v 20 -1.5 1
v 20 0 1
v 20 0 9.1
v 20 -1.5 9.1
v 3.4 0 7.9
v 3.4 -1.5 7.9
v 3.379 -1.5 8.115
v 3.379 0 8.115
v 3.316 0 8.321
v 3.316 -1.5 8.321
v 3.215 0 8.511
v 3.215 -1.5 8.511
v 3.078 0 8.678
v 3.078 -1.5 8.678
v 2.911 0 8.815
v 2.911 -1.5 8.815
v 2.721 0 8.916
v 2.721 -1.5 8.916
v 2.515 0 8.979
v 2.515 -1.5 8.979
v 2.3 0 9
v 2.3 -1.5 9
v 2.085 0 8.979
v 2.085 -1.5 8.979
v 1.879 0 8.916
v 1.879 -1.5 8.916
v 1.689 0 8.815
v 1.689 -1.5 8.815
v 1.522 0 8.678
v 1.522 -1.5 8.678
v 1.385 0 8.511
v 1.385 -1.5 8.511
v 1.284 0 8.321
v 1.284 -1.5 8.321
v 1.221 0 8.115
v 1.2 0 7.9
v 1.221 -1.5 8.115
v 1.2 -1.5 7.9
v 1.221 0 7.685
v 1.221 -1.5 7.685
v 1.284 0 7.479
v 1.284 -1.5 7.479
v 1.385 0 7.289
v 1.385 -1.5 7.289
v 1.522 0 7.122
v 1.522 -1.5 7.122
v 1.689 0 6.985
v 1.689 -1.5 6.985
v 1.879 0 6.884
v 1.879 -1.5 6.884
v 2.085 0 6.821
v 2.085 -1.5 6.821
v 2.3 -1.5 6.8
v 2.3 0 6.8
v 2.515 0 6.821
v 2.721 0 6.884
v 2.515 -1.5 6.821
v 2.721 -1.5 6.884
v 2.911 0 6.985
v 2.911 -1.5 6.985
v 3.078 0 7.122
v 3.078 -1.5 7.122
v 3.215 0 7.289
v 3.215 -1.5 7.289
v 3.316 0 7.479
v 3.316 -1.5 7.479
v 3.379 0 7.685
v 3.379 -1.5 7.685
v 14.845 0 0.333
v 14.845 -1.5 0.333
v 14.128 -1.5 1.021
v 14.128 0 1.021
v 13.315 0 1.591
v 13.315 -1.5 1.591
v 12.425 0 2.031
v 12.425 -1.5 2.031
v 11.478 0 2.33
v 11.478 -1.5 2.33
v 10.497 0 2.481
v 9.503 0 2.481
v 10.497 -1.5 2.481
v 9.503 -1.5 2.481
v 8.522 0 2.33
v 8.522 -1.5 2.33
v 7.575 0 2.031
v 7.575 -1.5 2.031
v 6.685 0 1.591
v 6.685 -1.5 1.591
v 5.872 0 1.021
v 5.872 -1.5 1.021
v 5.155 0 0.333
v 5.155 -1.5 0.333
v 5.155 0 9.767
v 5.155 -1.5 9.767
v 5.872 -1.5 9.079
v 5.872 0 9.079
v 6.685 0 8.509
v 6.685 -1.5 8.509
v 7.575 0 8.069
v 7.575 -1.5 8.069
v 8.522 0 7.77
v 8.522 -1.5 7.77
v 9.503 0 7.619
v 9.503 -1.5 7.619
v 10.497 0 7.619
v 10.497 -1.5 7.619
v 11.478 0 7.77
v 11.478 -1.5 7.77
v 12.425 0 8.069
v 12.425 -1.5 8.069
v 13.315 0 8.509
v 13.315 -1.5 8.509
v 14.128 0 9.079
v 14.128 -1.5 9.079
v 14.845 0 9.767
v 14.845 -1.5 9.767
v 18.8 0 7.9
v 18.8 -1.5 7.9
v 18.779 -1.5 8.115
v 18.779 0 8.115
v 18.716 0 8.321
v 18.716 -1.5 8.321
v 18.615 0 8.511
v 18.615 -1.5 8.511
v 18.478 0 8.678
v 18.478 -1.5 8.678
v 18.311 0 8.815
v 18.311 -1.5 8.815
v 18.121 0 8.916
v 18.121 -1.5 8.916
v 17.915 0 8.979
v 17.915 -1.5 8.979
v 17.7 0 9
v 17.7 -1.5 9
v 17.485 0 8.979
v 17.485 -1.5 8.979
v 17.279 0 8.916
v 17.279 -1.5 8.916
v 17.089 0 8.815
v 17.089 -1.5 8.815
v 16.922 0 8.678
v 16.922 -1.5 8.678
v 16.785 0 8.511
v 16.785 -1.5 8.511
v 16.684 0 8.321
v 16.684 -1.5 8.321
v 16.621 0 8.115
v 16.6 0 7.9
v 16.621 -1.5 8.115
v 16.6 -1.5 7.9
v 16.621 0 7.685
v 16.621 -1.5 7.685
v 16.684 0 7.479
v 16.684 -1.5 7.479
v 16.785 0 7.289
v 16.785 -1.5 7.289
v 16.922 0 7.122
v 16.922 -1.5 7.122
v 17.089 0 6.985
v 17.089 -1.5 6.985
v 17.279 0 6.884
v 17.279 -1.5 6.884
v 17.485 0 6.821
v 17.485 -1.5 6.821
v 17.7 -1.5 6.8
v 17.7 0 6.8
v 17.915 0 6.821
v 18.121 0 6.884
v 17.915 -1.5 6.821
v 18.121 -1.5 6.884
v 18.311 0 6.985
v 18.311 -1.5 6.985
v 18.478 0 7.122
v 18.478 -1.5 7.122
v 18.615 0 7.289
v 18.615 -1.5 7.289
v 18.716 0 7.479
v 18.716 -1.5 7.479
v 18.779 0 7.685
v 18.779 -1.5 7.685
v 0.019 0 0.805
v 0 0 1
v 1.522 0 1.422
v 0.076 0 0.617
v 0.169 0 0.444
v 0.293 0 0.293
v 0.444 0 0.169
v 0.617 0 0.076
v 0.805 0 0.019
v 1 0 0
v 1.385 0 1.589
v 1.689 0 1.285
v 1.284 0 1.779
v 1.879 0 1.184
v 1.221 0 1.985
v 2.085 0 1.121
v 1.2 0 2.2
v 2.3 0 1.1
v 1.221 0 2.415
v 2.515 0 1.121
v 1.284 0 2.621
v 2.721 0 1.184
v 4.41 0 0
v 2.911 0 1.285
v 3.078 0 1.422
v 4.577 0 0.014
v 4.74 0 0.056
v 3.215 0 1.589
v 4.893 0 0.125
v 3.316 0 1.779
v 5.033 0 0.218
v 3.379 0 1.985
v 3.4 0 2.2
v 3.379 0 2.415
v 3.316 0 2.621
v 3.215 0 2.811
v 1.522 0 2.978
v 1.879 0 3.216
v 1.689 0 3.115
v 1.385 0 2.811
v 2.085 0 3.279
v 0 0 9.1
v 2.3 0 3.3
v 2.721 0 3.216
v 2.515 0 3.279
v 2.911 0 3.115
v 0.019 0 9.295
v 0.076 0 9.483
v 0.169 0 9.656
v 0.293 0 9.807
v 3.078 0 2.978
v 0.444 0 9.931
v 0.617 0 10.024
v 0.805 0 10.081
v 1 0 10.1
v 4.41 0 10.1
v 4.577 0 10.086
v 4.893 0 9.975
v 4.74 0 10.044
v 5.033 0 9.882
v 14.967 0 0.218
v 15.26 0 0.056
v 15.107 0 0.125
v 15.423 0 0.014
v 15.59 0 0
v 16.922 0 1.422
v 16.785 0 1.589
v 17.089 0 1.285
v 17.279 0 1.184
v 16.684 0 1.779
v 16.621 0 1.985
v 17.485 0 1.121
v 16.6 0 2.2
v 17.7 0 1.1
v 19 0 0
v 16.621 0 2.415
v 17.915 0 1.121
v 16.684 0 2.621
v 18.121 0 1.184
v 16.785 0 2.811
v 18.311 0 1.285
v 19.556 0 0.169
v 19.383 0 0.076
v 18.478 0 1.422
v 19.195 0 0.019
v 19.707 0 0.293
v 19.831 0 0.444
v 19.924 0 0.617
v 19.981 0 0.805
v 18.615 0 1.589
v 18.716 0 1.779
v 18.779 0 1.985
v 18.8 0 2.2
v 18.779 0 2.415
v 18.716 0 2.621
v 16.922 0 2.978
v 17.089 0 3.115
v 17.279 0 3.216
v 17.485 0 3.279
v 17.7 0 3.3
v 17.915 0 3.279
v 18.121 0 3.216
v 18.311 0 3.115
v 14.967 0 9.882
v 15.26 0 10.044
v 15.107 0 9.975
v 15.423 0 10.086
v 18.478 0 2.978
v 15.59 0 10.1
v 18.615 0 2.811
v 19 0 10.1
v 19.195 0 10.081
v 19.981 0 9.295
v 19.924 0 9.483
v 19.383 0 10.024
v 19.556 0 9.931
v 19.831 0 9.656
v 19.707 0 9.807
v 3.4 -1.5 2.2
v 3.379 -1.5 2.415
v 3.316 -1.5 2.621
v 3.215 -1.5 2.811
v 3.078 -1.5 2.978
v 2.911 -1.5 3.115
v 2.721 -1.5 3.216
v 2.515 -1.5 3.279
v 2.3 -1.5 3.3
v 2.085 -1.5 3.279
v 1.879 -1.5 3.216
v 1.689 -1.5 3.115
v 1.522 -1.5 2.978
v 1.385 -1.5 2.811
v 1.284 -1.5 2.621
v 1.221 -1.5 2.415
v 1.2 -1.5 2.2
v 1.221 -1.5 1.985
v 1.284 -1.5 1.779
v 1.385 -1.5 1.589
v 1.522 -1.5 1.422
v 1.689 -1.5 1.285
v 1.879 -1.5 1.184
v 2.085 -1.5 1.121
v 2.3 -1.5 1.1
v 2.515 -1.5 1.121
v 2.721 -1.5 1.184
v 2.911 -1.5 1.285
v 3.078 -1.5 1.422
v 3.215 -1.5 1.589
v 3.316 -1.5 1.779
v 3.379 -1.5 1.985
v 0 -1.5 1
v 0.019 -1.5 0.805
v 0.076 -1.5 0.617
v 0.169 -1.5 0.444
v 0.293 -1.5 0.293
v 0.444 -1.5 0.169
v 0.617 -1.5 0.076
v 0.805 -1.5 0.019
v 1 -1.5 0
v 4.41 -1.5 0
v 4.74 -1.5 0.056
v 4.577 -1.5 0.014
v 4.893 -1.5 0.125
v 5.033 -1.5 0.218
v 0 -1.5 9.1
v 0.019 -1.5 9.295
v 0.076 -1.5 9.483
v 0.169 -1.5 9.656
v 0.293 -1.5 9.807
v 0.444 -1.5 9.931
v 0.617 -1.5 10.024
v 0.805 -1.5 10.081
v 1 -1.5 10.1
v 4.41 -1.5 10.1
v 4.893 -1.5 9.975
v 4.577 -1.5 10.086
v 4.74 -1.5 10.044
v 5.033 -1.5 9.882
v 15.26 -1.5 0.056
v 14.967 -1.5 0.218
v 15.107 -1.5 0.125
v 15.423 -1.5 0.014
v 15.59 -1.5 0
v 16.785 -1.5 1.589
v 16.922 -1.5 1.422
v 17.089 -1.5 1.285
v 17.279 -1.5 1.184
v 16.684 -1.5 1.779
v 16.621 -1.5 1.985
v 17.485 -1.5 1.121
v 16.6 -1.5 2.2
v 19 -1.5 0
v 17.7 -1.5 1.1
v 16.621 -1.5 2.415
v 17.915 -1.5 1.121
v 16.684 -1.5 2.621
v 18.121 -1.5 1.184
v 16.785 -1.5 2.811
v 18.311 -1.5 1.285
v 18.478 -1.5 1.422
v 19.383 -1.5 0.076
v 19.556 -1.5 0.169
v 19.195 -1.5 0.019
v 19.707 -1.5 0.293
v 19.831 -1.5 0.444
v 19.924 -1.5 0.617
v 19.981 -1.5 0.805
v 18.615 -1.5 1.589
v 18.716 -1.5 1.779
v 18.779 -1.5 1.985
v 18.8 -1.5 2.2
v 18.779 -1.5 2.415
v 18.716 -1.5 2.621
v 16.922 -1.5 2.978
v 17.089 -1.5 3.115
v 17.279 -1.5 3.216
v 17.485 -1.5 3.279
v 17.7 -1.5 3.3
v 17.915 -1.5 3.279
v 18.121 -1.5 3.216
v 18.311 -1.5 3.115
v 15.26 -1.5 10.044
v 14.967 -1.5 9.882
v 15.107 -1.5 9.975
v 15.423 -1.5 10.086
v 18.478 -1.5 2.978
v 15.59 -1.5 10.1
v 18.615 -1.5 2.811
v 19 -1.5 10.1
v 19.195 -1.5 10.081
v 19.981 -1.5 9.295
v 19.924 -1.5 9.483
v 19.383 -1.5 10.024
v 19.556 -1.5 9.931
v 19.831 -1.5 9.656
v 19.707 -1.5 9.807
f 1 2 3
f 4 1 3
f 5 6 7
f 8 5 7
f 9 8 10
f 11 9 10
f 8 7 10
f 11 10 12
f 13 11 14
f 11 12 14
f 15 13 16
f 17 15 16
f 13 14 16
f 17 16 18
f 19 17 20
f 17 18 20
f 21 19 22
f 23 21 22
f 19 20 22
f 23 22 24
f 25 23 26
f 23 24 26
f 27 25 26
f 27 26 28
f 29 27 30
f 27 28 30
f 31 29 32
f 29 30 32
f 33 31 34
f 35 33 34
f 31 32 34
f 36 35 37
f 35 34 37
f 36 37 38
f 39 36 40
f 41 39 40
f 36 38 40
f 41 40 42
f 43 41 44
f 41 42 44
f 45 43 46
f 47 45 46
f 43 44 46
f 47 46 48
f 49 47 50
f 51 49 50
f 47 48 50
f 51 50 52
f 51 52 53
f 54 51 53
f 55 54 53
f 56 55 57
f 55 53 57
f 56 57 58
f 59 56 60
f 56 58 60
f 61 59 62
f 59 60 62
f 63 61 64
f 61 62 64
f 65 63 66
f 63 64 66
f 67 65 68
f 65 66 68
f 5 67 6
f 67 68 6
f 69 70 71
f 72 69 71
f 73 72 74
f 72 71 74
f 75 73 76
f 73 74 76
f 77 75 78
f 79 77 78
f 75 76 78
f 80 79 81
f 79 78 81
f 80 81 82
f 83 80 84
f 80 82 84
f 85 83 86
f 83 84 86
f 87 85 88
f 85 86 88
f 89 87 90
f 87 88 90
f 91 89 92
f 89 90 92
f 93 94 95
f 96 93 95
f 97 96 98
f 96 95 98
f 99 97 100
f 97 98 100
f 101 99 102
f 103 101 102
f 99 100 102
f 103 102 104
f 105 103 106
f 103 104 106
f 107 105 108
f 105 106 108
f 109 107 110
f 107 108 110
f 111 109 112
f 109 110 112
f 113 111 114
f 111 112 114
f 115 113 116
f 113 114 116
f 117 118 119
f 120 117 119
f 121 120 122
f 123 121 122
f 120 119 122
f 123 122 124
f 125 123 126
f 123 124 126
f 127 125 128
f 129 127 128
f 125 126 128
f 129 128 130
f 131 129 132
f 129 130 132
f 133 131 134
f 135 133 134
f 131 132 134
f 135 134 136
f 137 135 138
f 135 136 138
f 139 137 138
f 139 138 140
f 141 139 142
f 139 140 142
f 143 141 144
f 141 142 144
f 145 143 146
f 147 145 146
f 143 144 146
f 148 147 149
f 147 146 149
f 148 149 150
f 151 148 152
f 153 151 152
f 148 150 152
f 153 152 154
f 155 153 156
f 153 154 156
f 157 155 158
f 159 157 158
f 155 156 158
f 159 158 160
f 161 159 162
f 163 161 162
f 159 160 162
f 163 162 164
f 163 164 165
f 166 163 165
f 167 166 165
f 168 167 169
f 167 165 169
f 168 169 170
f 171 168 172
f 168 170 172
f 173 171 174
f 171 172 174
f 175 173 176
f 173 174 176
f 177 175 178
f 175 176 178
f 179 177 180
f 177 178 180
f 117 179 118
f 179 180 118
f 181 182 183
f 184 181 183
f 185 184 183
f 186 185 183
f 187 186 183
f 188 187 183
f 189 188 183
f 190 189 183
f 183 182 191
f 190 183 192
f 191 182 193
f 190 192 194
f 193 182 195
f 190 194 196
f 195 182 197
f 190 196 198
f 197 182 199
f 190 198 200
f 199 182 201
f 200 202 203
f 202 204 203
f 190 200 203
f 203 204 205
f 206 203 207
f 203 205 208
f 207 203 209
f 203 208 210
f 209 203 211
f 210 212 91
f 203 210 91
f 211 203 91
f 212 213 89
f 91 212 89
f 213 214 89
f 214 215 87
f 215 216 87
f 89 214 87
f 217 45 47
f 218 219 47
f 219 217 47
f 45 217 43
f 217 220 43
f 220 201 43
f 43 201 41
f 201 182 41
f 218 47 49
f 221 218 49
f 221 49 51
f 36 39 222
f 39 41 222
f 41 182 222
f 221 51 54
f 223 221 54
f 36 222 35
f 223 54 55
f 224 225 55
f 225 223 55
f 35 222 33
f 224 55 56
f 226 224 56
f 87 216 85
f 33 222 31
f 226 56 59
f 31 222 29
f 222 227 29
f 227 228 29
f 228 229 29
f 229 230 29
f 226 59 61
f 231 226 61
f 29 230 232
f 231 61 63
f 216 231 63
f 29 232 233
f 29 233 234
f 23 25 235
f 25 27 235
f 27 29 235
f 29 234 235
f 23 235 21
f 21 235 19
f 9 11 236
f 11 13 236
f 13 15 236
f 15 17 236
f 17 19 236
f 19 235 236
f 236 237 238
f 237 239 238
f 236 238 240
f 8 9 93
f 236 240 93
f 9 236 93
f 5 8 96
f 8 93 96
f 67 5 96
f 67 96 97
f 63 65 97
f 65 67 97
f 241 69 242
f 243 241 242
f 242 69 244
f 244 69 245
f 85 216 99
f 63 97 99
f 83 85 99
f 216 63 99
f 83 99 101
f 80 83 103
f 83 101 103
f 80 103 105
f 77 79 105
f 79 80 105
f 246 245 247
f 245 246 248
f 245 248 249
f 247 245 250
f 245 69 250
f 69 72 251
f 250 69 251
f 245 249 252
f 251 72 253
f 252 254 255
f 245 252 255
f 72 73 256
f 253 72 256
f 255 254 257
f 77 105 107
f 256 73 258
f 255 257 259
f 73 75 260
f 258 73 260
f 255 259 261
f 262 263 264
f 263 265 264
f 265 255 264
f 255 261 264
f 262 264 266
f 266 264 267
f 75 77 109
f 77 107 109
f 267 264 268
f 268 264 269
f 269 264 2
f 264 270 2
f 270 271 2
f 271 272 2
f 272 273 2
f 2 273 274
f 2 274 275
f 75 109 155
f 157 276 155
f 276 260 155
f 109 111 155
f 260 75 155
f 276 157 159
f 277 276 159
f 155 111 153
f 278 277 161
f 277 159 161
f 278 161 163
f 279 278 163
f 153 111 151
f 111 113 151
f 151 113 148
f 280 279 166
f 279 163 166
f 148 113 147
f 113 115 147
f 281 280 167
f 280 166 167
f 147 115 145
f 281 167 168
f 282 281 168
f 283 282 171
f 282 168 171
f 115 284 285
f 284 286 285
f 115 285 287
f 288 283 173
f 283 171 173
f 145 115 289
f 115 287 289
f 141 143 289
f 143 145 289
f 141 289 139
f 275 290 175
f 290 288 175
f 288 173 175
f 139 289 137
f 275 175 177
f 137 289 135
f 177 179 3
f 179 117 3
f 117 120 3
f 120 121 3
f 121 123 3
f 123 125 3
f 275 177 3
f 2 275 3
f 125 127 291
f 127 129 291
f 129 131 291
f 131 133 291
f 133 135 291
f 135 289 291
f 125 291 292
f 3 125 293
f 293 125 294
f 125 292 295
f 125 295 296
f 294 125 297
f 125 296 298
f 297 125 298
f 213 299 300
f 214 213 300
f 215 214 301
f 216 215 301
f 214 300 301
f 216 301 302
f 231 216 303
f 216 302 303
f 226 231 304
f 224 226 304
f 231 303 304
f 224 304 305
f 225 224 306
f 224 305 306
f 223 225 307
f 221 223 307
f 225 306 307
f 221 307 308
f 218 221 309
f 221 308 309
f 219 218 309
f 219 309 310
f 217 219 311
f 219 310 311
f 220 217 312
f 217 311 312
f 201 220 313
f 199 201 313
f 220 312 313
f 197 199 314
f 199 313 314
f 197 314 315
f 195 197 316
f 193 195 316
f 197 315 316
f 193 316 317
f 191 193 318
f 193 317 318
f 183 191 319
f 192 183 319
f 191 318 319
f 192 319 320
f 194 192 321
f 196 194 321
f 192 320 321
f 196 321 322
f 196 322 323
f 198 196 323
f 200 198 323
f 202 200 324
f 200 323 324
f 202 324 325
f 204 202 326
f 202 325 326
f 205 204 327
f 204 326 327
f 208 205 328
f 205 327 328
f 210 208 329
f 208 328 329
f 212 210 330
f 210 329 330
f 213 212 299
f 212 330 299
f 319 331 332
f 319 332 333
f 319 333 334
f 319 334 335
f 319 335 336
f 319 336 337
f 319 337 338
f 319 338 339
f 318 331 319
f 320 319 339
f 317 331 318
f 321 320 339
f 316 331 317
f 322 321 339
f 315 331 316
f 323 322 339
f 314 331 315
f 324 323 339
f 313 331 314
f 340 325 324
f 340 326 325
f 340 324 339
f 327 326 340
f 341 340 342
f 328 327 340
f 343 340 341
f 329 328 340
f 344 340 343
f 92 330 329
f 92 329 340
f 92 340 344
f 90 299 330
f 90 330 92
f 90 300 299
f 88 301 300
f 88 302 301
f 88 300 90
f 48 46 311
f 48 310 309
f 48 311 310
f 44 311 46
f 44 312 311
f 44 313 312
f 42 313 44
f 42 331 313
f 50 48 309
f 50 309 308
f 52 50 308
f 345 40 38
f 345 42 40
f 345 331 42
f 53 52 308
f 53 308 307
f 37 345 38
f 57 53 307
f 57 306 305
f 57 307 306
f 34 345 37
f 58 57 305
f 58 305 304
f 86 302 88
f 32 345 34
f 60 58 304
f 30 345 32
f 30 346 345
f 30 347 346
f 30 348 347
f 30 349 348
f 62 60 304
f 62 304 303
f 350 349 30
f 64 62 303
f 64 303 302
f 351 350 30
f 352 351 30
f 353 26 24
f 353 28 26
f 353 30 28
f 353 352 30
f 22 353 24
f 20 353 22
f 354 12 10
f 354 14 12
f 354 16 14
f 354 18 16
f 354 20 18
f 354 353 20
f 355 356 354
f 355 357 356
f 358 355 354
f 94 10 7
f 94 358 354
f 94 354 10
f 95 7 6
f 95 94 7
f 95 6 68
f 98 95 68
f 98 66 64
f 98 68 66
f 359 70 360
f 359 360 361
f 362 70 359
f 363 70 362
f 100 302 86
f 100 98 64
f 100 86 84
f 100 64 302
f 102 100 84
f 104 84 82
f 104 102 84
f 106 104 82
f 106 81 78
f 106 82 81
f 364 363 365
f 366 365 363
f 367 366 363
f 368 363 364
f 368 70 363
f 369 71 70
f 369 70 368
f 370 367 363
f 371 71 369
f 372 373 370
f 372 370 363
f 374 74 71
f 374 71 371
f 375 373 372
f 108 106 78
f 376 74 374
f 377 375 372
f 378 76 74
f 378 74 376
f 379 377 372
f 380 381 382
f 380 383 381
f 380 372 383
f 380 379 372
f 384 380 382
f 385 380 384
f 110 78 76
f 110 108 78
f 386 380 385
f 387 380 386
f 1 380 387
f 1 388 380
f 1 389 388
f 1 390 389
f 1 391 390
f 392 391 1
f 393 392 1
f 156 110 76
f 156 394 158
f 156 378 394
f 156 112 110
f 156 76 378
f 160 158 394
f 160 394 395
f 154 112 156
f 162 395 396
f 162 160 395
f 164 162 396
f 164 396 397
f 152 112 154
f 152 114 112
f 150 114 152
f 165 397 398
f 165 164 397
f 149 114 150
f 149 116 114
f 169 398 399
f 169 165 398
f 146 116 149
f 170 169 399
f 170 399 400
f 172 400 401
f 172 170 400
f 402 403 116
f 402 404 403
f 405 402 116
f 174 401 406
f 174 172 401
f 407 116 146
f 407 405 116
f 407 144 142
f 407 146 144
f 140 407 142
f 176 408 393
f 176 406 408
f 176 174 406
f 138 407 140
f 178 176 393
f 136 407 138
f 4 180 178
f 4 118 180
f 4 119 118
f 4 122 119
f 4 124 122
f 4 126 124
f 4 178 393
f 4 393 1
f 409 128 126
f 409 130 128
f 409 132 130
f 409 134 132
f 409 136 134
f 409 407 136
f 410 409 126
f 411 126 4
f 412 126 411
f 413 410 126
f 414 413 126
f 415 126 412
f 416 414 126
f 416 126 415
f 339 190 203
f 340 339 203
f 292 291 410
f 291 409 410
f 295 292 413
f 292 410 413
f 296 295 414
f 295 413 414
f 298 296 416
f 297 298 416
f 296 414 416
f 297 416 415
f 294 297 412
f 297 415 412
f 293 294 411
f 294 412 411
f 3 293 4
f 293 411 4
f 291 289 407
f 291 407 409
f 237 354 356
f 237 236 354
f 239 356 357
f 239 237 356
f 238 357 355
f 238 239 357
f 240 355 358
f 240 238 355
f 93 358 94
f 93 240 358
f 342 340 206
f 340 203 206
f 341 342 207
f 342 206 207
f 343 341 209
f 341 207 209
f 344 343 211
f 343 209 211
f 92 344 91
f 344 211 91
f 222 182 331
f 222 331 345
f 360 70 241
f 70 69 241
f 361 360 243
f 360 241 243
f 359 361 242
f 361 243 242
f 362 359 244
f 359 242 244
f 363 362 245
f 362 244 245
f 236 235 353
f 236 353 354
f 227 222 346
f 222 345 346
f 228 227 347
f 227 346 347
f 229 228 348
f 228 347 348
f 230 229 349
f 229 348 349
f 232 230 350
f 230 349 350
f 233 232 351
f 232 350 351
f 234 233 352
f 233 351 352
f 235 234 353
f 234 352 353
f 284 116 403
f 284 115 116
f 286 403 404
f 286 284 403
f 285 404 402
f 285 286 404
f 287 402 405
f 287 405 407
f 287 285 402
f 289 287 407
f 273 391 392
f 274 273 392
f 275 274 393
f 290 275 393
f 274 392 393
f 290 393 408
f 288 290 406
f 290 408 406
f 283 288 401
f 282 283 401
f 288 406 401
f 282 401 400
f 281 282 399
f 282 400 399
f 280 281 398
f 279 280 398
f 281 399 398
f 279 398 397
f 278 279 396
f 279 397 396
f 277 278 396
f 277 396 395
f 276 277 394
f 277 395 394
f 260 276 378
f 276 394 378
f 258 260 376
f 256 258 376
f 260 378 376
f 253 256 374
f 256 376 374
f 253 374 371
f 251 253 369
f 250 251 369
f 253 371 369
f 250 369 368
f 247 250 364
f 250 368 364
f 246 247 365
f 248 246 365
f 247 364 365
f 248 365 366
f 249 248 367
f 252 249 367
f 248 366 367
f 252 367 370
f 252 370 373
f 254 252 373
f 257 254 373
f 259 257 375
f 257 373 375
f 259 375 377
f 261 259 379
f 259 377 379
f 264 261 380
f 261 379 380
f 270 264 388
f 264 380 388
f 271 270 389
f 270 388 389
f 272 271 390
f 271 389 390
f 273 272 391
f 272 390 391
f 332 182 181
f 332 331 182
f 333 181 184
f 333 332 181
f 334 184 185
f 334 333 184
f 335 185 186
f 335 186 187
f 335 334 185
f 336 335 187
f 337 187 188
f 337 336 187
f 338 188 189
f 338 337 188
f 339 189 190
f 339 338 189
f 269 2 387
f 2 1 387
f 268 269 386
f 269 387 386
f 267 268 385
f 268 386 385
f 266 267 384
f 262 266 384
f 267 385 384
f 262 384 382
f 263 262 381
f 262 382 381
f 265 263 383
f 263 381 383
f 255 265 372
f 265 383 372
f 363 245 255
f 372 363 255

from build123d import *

# Parameters (mm, degrees)
F0_W     = 20
F0_H     = 10.1
F1_DEPTH = 1.5
F2_R     = 1.1
F3_DEPTH = 1.5
F4_R     = 1


with BuildPart() as f1:
    # F0 (on Front) → F1 (new body)
    with BuildSketch(Plane.XZ):
        with Locations((10, 5.05)):
            Rectangle(F0_W, F0_H)
    extrude(amount=F1_DEPTH)

    # F2 (on face) → F3 (cut, through all)
    with BuildSketch(Plane.XZ.offset(1.5)):
        with Locations((2.3, 7.9)):
            Circle(F2_R)
        with Locations((17.7, 7.9)):
            Circle(F2_R)
        with Locations((2.3, 2.2)):
            Circle(F2_R)
        with Locations((17.7, 2.2)):
            Circle(F2_R)
        with BuildLine():
            Line((15.123475383, 10.1), (4.876524617, 10.1))
            ThreePointArc((4.876524617, 10.1), (10, 7.6), (15.123475383, 10.1))
        make_face()
        with BuildLine():
            ThreePointArc((15.123475383, 0), (10, 2.5), (4.876524617, 0))
            Line((4.876524617, 0), (15.123475383, 0))
        make_face()
    extrude(amount=-F3_DEPTH, mode=Mode.SUBTRACT)

    # F4
    f4_edges = [f1.edges().sort_by_distance(p)[0] for p in [
        (20, -0.75, 10.1),
        (20, -0.75, 0),
        (0, -0.75, 10.1),
        (0, -0.75, 0),
        (4.876525, -0.75, 10.1),
        (15.123475, -0.75, 10.1),
        (4.876525, -0.75, 0),
        (15.123475, -0.75, 0),
    ]]
    fillet(f4_edges, radius=F4_R)


solid = f1.part
